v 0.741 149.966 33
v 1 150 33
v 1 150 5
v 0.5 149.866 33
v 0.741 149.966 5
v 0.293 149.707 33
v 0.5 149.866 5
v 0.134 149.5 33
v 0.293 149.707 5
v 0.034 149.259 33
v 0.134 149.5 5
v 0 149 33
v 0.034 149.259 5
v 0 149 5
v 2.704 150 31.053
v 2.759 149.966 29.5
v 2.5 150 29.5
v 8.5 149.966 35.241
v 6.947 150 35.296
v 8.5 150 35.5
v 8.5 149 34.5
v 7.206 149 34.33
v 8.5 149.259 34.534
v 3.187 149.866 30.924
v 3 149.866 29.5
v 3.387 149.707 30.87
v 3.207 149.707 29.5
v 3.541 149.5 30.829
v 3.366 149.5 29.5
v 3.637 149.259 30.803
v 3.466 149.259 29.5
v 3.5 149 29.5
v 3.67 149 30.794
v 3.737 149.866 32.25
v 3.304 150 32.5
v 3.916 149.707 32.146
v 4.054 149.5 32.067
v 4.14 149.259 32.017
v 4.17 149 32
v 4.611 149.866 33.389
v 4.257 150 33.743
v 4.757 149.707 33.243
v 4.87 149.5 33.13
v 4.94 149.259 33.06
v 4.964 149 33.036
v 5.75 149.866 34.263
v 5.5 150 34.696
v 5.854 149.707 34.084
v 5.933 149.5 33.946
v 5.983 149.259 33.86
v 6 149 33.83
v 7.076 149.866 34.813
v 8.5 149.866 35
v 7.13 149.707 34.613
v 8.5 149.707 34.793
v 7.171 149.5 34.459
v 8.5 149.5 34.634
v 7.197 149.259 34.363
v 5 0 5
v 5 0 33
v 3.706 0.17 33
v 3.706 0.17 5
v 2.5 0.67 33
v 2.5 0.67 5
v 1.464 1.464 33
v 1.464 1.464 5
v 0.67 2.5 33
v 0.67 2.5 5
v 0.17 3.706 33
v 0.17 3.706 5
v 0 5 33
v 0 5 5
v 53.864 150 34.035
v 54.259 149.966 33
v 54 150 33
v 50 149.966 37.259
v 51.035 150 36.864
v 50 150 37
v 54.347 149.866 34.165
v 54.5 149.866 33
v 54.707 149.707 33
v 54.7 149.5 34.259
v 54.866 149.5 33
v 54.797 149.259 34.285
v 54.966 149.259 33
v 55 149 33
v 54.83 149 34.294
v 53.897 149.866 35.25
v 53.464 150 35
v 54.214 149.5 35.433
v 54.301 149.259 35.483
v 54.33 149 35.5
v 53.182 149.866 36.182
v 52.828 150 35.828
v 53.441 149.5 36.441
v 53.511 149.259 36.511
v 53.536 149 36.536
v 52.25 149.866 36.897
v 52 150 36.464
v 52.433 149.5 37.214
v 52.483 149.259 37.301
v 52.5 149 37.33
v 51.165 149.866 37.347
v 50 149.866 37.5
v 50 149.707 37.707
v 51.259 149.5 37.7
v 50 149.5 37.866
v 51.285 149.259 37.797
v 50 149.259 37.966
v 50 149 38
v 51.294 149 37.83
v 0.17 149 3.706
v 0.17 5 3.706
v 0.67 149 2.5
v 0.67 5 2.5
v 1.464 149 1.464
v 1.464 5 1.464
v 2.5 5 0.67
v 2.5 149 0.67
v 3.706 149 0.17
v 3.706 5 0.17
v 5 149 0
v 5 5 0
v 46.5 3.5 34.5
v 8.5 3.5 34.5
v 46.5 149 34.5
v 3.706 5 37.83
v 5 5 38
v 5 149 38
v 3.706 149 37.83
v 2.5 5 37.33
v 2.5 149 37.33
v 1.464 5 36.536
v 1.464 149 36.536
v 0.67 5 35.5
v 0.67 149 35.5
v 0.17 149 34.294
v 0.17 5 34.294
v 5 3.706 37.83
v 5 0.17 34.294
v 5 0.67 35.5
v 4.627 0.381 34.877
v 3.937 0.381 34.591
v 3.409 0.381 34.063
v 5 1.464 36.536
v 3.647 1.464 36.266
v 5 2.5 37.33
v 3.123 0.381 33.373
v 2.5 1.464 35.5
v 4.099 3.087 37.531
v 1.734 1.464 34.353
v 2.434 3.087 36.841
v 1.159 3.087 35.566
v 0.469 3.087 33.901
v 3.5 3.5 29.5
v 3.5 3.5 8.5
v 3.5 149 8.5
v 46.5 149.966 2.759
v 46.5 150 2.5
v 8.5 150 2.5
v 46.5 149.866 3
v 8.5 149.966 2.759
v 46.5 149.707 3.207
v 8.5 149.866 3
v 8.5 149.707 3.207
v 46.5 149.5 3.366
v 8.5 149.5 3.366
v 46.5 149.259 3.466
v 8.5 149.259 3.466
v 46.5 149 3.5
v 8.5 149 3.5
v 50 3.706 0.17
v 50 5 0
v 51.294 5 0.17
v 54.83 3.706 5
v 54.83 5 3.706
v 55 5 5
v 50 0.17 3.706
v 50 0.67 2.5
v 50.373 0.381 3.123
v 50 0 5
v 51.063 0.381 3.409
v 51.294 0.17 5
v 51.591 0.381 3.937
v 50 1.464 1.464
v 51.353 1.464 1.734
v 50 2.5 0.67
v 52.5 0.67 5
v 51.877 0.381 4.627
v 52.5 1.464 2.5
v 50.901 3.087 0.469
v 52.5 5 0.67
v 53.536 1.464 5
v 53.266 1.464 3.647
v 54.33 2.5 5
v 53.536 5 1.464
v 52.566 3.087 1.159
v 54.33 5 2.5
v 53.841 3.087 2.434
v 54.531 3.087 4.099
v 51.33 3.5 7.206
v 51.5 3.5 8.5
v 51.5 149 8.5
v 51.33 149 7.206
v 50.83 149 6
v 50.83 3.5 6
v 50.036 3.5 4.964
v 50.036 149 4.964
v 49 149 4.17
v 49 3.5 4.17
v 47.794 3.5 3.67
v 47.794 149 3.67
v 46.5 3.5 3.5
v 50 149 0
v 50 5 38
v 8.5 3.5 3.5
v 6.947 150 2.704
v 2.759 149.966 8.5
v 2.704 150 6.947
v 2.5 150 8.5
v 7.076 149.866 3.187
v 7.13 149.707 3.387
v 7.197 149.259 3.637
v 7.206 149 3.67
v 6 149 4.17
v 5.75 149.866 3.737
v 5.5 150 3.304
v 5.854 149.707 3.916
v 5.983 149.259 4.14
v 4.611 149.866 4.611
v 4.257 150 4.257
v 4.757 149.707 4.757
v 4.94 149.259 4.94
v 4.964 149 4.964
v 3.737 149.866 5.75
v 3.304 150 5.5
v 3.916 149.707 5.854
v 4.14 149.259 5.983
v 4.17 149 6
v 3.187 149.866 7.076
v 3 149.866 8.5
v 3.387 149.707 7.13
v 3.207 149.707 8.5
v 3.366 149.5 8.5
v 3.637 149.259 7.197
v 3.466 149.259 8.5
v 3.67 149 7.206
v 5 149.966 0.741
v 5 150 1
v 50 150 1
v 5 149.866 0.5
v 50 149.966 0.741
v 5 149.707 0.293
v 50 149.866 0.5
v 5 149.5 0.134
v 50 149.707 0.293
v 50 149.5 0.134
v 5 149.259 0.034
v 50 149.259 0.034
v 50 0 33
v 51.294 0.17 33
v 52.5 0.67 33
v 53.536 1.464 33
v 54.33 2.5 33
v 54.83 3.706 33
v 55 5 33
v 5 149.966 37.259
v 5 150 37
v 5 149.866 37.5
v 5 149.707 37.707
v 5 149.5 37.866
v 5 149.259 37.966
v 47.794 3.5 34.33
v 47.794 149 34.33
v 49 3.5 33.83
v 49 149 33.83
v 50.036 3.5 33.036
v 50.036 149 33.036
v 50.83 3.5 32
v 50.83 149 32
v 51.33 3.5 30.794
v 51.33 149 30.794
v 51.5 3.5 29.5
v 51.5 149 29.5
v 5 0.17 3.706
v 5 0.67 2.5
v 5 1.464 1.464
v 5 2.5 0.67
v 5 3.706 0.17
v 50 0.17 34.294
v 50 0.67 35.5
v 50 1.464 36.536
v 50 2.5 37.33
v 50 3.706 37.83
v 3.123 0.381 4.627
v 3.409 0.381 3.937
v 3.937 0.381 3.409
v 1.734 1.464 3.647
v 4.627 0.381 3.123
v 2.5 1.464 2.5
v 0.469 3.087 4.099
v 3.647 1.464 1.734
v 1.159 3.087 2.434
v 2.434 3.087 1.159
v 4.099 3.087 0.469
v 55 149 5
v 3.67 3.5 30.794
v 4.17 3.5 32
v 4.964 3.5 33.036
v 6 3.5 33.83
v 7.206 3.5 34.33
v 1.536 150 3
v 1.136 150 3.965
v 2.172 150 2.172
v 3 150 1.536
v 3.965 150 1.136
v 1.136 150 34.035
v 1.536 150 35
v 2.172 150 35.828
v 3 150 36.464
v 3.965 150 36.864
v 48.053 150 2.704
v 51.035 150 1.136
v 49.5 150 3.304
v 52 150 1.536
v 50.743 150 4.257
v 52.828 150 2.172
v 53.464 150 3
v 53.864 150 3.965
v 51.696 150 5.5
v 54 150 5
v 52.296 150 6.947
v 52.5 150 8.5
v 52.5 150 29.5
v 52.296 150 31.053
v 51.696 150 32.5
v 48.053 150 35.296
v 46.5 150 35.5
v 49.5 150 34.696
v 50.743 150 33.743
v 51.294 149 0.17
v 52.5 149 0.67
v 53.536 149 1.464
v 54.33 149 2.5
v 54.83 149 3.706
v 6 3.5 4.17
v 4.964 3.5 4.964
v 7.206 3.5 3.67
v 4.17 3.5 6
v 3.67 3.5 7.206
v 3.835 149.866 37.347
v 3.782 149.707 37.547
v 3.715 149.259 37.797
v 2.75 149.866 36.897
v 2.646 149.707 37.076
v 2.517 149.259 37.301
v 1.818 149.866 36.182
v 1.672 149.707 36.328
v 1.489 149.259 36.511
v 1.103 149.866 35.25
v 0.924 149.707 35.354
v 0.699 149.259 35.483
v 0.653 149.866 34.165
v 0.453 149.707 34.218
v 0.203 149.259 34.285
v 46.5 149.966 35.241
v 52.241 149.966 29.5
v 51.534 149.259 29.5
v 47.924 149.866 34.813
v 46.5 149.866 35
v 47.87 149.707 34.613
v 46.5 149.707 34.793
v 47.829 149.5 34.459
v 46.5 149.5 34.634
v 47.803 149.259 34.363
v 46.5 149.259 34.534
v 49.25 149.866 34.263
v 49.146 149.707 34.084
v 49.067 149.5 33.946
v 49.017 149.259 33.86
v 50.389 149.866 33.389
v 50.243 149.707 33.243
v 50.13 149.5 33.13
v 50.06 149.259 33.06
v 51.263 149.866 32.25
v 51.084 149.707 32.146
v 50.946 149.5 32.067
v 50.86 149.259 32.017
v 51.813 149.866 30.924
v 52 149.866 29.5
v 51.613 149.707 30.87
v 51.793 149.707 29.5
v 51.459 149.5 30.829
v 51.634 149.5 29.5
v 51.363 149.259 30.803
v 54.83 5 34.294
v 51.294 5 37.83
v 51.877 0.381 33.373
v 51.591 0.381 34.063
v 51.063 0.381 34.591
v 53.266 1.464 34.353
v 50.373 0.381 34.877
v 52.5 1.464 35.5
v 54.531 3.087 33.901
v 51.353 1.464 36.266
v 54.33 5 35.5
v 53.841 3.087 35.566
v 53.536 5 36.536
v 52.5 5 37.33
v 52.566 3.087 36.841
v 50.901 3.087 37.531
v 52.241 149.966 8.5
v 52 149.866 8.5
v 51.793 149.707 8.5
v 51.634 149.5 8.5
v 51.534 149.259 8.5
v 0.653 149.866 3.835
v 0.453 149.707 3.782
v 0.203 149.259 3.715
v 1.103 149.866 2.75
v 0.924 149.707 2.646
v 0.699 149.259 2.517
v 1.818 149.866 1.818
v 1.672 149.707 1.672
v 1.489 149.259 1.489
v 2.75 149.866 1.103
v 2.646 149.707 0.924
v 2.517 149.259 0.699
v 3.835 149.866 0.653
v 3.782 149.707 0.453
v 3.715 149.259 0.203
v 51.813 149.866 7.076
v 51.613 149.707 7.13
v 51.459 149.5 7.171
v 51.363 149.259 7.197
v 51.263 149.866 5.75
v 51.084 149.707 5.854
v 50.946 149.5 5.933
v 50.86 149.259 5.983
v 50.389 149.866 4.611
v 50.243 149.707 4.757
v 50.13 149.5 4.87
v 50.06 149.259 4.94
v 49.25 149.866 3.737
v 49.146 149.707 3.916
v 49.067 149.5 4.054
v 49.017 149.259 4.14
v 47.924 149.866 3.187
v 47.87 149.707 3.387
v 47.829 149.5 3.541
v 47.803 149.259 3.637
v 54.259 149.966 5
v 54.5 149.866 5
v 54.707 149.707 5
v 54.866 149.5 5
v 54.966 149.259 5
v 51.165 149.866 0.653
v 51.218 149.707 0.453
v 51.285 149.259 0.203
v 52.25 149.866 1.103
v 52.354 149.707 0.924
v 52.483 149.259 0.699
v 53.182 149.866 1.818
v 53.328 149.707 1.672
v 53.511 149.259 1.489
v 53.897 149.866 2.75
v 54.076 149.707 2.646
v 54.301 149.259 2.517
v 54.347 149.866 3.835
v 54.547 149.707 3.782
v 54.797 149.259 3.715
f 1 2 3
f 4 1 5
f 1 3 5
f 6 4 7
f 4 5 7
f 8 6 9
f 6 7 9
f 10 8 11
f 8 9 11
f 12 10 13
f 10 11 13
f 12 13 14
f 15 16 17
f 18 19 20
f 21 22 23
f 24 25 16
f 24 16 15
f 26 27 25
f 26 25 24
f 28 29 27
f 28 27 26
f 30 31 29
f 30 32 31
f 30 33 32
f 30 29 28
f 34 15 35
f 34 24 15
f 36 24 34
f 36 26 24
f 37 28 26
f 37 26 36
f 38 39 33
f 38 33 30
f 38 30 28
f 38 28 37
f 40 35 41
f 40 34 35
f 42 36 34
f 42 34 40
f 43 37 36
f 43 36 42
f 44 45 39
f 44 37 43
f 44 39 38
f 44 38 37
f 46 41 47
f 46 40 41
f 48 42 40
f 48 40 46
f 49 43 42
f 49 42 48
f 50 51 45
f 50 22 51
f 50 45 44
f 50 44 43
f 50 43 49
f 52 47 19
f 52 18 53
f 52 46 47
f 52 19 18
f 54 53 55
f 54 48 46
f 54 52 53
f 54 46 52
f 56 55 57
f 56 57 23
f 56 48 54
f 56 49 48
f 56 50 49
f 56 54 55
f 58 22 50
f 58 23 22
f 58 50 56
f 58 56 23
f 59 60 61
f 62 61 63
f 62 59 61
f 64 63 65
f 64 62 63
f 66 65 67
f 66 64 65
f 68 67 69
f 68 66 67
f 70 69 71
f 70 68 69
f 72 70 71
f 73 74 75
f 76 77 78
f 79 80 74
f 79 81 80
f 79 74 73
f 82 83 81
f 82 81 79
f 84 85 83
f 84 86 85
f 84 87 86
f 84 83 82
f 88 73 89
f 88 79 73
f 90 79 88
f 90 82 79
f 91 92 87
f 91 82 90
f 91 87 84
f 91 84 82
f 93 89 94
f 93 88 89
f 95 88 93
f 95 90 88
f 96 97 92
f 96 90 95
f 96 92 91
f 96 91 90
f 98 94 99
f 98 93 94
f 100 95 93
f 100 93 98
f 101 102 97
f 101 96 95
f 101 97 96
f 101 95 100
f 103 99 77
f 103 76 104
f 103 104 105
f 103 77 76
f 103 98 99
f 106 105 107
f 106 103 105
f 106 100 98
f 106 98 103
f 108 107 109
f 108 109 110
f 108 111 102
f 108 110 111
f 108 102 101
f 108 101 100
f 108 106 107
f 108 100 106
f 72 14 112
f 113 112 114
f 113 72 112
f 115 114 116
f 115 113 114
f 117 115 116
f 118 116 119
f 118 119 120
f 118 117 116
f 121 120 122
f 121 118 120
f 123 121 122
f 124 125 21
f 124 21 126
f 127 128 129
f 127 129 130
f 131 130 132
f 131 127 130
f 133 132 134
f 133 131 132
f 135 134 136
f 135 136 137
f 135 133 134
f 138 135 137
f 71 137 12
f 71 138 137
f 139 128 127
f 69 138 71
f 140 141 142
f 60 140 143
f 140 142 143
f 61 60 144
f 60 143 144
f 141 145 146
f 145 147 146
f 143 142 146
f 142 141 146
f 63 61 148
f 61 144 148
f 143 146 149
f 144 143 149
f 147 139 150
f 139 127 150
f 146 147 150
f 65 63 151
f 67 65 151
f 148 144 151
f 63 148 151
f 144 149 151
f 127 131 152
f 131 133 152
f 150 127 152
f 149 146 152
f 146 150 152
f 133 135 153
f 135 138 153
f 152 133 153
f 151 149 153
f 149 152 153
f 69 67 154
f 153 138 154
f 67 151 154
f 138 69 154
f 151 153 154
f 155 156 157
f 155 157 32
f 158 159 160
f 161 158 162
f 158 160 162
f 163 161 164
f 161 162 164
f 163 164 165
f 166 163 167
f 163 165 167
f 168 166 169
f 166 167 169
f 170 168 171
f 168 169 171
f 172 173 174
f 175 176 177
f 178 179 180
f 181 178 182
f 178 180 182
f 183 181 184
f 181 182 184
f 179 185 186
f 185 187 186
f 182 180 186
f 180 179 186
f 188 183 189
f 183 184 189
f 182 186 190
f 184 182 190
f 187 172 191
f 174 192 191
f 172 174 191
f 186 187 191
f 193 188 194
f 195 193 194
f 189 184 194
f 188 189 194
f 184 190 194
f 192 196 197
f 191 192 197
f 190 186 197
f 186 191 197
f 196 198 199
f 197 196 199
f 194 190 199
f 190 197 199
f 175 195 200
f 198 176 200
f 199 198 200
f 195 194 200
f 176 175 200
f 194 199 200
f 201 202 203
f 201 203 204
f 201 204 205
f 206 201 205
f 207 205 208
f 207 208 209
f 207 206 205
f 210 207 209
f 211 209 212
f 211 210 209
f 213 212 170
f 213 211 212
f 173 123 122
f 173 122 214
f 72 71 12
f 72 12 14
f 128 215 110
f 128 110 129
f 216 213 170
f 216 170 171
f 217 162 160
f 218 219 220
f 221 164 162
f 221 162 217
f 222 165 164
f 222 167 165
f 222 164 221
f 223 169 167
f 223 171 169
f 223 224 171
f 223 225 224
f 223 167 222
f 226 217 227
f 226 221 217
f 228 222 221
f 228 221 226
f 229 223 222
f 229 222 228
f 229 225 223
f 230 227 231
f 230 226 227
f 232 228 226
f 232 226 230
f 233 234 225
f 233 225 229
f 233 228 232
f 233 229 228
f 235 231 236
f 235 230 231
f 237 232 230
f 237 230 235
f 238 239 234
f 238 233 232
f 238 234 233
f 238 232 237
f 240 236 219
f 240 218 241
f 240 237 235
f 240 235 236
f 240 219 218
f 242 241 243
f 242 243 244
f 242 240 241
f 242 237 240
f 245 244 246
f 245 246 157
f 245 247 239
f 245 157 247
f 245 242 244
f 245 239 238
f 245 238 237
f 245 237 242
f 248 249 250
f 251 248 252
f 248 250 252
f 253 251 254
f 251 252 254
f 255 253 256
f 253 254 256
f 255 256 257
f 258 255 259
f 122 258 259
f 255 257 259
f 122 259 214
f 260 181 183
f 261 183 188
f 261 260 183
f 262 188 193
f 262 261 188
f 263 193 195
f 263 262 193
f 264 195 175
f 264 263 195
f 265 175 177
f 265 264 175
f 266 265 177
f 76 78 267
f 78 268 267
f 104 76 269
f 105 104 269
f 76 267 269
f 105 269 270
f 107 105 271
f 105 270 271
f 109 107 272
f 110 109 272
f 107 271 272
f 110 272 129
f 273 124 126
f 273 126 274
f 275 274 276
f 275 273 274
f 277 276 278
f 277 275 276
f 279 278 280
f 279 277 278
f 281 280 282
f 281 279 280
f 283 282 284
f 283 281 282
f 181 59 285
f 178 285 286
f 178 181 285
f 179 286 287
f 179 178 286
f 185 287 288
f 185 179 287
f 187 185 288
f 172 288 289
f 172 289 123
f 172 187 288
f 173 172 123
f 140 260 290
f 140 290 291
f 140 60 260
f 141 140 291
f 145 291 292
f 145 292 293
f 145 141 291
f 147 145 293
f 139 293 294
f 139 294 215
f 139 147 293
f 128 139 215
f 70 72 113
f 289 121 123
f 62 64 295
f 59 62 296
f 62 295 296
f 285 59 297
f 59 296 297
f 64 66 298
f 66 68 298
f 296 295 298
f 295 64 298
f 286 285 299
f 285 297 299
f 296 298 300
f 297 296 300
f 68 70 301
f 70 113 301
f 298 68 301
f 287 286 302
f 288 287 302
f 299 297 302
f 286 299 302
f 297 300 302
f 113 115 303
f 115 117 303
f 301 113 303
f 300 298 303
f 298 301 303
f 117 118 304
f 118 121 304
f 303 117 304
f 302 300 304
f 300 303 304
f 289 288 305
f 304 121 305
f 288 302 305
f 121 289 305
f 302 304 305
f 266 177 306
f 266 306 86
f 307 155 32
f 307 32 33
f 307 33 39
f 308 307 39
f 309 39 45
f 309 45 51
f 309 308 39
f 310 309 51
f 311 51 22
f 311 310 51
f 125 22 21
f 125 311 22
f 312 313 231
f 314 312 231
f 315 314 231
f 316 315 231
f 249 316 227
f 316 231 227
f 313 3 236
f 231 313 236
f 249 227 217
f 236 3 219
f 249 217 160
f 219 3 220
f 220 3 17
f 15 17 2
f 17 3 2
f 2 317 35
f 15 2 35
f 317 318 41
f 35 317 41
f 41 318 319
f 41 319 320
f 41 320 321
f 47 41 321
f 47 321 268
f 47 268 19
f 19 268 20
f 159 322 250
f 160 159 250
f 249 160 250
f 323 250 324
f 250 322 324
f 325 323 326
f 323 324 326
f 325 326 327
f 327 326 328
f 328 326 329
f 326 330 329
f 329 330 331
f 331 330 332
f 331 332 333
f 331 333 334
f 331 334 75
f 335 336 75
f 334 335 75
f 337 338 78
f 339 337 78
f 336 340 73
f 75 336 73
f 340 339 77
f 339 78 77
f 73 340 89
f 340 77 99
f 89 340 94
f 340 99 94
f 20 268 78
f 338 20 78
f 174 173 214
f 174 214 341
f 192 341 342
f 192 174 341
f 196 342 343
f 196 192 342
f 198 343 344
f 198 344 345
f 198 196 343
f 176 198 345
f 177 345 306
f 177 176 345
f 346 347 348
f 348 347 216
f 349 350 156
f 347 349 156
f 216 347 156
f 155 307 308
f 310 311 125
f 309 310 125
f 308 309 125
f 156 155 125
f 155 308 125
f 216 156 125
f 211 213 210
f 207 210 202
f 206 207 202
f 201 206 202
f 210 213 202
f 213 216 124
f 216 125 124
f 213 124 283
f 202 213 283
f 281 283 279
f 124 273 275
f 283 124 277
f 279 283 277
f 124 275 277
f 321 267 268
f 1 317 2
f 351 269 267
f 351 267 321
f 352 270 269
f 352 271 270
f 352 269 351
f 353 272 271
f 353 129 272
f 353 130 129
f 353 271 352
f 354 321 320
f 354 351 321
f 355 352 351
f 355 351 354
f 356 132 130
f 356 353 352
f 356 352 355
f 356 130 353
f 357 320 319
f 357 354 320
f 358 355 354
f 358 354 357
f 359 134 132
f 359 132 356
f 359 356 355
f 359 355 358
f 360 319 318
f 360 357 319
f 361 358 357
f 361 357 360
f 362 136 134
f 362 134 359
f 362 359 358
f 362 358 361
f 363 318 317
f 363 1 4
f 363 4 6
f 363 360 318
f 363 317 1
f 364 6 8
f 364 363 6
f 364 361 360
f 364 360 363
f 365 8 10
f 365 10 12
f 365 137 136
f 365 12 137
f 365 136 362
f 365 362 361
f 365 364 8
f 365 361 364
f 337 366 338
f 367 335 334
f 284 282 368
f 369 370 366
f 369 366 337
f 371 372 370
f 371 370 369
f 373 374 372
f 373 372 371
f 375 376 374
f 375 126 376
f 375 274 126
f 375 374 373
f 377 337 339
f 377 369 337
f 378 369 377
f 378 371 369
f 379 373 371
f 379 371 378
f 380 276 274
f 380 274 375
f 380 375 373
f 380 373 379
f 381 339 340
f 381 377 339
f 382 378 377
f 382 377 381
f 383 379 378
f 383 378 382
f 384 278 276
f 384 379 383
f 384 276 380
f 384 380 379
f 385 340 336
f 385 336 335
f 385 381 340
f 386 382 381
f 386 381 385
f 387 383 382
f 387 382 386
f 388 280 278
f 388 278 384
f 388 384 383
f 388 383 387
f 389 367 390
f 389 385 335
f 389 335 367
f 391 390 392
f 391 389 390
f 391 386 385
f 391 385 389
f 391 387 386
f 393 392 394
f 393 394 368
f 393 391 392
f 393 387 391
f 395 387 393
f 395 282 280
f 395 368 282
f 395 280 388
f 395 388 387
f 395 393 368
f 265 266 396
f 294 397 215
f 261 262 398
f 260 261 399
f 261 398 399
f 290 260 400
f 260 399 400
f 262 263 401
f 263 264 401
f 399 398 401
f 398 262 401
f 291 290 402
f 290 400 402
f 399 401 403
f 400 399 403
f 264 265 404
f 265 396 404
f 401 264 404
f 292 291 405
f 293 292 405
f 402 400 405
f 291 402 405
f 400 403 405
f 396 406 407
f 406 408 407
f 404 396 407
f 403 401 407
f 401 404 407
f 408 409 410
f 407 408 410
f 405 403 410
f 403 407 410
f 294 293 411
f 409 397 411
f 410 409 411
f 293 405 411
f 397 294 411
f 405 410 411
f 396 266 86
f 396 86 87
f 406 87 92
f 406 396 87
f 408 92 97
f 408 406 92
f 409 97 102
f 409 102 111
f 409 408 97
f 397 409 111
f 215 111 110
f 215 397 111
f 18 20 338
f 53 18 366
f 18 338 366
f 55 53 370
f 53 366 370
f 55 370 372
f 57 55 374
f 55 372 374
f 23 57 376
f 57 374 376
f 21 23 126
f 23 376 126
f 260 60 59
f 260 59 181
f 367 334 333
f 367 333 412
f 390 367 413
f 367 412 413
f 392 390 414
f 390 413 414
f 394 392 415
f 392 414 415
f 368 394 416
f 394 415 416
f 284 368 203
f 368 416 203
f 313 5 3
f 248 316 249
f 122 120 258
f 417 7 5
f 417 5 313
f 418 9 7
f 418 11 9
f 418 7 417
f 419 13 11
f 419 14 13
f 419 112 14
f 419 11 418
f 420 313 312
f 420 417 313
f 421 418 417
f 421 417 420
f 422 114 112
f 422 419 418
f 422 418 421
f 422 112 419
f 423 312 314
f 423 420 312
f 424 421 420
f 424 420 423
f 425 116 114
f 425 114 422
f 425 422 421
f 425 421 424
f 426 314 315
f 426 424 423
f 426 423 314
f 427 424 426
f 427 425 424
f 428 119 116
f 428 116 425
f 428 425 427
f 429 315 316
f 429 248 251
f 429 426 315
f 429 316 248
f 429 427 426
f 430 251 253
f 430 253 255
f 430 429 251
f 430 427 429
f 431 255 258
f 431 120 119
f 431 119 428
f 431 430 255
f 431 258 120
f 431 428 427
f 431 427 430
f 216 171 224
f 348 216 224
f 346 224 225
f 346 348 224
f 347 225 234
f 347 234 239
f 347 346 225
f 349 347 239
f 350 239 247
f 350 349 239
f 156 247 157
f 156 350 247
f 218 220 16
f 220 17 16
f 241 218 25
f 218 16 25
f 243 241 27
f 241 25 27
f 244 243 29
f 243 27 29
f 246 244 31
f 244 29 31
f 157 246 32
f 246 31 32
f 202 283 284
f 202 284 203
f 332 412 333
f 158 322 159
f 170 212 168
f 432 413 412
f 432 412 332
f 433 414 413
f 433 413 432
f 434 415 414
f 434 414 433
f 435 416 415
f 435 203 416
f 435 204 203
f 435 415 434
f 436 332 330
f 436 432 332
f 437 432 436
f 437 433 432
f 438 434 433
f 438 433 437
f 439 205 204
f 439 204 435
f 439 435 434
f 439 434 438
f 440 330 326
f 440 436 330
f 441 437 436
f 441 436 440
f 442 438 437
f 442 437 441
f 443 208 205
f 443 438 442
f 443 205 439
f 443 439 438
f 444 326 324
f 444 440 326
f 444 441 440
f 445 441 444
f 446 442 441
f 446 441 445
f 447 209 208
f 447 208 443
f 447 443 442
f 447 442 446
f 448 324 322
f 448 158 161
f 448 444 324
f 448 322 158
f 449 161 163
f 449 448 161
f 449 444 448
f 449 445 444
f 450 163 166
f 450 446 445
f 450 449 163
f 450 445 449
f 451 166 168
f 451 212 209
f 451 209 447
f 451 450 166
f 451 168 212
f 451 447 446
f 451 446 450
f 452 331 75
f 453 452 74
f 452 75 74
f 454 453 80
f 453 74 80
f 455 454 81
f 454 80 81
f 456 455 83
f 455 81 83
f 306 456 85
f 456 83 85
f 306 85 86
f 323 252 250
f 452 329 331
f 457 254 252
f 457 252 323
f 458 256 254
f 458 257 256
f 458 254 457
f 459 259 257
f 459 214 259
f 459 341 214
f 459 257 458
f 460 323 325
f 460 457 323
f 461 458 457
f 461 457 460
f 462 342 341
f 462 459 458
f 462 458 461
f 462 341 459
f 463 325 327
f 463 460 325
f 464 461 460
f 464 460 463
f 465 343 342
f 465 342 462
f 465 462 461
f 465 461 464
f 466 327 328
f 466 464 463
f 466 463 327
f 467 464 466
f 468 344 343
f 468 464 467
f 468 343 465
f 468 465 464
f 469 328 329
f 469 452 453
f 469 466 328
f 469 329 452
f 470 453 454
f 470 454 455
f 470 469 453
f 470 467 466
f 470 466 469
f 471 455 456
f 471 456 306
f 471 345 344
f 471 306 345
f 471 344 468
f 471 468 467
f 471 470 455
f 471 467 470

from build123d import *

# Parameters (mm, degrees)
F1_DEPTH = 3.5
F2_DEPTH = 150
F3_R     = 5
F4_R     = 1


with BuildPart() as f1:
    # F0 (on Front) → F1 (new body)
    with BuildSketch(Plane.XZ):
        with BuildLine():
            ThreePointArc((3.5, 8.5), (4.9644660941, 4.9644660941), (8.5, 3.5))
            Line((8.5, 3.5), (46.5, 3.5))
            ThreePointArc((46.5, 3.5), (50.0355339059, 4.9644660941), (51.5, 8.5))
            Line((51.5, 8.5), (51.5, 29.5))
            ThreePointArc((51.5, 29.5), (50.0355339059, 33.0355339059), (46.5, 34.5))
            Line((46.5, 34.5), (8.5, 34.5))
            ThreePointArc((8.5, 34.5), (4.9644660941, 33.0355339059), (3.5, 29.5))
            Line((3.5, 29.5), (3.5, 8.5))
        make_face()
    extrude(amount=-F1_DEPTH)

    # F0 (on Front) → F2 (join)
    with BuildSketch(Plane.XZ):
        with BuildLine():
            ThreePointArc((0, 5), (1.4644660941, 1.4644660941), (5, 0))
            Line((5, 0), (50, 0))
            ThreePointArc((50, 0), (53.5355339059, 1.4644660941), (55, 5))
            Line((55, 5), (55, 33))
            ThreePointArc((55, 33), (53.5355339059, 36.5355339059), (50, 38))
            Line((50, 38), (5, 38))
            ThreePointArc((5, 38), (1.4644660941, 36.5355339059), (0, 33))
            Line((0, 33), (0, 5))
        make_face()
        with BuildLine():
            Line((46.5, 3.5), (8.5, 3.5))
            ThreePointArc((8.5, 3.5), (4.9644660941, 4.9644660941), (3.5, 8.5))
            Line((3.5, 8.5), (3.5, 29.5))
            ThreePointArc((3.5, 29.5), (4.9644660941, 33.0355339059), (8.5, 34.5))
            Line((8.5, 34.5), (46.5, 34.5))
            ThreePointArc((46.5, 34.5), (50.0355339059, 33.0355339059), (51.5, 29.5))
            Line((51.5, 29.5), (51.5, 8.5))
            ThreePointArc((51.5, 8.5), (50.0355339059, 4.9644660941), (46.5, 3.5))
        make_face(mode=Mode.SUBTRACT)
    extrude(amount=-F2_DEPTH)

    # F3
    f3_edges = [f1.edges().sort_by_distance(p)[0] for p in [
        (1.464466, 0, 36.535534),
        (0, 0, 19),
        (27.5, 0, 38),
        (53.535534, 0, 36.535534),
        (55, 0, 19),
        (53.535534, 0, 1.464466),
        (27.5, 0, 0),
        (1.464466, 0, 1.464466),
    ]]
    fillet(f3_edges, radius=F3_R)

    # F4
    f4_edges = [f1.edges().sort_by_distance(p)[0] for p in [
        (27.5, 150, 38),
        (53.535534, 150, 36.535534),
        (55, 150, 19),
        (53.535534, 150, 1.464466),
        (27.5, 150, 0),
        (1.464466, 150, 1.464466),
        (0, 150, 19),
        (1.464466, 150, 36.535534),
        (3.5, 150, 19),
        (4.964466, 150, 33.035534),
        (27.5, 150, 34.5),
        (50.035534, 150, 33.035534),
        (51.5, 150, 19),
        (50.035534, 150, 4.964466),
        (27.5, 150, 3.5),
        (4.964466, 150, 4.964466),
    ]]
    fillet(f4_edges, radius=F4_R)


solid = f1.part
